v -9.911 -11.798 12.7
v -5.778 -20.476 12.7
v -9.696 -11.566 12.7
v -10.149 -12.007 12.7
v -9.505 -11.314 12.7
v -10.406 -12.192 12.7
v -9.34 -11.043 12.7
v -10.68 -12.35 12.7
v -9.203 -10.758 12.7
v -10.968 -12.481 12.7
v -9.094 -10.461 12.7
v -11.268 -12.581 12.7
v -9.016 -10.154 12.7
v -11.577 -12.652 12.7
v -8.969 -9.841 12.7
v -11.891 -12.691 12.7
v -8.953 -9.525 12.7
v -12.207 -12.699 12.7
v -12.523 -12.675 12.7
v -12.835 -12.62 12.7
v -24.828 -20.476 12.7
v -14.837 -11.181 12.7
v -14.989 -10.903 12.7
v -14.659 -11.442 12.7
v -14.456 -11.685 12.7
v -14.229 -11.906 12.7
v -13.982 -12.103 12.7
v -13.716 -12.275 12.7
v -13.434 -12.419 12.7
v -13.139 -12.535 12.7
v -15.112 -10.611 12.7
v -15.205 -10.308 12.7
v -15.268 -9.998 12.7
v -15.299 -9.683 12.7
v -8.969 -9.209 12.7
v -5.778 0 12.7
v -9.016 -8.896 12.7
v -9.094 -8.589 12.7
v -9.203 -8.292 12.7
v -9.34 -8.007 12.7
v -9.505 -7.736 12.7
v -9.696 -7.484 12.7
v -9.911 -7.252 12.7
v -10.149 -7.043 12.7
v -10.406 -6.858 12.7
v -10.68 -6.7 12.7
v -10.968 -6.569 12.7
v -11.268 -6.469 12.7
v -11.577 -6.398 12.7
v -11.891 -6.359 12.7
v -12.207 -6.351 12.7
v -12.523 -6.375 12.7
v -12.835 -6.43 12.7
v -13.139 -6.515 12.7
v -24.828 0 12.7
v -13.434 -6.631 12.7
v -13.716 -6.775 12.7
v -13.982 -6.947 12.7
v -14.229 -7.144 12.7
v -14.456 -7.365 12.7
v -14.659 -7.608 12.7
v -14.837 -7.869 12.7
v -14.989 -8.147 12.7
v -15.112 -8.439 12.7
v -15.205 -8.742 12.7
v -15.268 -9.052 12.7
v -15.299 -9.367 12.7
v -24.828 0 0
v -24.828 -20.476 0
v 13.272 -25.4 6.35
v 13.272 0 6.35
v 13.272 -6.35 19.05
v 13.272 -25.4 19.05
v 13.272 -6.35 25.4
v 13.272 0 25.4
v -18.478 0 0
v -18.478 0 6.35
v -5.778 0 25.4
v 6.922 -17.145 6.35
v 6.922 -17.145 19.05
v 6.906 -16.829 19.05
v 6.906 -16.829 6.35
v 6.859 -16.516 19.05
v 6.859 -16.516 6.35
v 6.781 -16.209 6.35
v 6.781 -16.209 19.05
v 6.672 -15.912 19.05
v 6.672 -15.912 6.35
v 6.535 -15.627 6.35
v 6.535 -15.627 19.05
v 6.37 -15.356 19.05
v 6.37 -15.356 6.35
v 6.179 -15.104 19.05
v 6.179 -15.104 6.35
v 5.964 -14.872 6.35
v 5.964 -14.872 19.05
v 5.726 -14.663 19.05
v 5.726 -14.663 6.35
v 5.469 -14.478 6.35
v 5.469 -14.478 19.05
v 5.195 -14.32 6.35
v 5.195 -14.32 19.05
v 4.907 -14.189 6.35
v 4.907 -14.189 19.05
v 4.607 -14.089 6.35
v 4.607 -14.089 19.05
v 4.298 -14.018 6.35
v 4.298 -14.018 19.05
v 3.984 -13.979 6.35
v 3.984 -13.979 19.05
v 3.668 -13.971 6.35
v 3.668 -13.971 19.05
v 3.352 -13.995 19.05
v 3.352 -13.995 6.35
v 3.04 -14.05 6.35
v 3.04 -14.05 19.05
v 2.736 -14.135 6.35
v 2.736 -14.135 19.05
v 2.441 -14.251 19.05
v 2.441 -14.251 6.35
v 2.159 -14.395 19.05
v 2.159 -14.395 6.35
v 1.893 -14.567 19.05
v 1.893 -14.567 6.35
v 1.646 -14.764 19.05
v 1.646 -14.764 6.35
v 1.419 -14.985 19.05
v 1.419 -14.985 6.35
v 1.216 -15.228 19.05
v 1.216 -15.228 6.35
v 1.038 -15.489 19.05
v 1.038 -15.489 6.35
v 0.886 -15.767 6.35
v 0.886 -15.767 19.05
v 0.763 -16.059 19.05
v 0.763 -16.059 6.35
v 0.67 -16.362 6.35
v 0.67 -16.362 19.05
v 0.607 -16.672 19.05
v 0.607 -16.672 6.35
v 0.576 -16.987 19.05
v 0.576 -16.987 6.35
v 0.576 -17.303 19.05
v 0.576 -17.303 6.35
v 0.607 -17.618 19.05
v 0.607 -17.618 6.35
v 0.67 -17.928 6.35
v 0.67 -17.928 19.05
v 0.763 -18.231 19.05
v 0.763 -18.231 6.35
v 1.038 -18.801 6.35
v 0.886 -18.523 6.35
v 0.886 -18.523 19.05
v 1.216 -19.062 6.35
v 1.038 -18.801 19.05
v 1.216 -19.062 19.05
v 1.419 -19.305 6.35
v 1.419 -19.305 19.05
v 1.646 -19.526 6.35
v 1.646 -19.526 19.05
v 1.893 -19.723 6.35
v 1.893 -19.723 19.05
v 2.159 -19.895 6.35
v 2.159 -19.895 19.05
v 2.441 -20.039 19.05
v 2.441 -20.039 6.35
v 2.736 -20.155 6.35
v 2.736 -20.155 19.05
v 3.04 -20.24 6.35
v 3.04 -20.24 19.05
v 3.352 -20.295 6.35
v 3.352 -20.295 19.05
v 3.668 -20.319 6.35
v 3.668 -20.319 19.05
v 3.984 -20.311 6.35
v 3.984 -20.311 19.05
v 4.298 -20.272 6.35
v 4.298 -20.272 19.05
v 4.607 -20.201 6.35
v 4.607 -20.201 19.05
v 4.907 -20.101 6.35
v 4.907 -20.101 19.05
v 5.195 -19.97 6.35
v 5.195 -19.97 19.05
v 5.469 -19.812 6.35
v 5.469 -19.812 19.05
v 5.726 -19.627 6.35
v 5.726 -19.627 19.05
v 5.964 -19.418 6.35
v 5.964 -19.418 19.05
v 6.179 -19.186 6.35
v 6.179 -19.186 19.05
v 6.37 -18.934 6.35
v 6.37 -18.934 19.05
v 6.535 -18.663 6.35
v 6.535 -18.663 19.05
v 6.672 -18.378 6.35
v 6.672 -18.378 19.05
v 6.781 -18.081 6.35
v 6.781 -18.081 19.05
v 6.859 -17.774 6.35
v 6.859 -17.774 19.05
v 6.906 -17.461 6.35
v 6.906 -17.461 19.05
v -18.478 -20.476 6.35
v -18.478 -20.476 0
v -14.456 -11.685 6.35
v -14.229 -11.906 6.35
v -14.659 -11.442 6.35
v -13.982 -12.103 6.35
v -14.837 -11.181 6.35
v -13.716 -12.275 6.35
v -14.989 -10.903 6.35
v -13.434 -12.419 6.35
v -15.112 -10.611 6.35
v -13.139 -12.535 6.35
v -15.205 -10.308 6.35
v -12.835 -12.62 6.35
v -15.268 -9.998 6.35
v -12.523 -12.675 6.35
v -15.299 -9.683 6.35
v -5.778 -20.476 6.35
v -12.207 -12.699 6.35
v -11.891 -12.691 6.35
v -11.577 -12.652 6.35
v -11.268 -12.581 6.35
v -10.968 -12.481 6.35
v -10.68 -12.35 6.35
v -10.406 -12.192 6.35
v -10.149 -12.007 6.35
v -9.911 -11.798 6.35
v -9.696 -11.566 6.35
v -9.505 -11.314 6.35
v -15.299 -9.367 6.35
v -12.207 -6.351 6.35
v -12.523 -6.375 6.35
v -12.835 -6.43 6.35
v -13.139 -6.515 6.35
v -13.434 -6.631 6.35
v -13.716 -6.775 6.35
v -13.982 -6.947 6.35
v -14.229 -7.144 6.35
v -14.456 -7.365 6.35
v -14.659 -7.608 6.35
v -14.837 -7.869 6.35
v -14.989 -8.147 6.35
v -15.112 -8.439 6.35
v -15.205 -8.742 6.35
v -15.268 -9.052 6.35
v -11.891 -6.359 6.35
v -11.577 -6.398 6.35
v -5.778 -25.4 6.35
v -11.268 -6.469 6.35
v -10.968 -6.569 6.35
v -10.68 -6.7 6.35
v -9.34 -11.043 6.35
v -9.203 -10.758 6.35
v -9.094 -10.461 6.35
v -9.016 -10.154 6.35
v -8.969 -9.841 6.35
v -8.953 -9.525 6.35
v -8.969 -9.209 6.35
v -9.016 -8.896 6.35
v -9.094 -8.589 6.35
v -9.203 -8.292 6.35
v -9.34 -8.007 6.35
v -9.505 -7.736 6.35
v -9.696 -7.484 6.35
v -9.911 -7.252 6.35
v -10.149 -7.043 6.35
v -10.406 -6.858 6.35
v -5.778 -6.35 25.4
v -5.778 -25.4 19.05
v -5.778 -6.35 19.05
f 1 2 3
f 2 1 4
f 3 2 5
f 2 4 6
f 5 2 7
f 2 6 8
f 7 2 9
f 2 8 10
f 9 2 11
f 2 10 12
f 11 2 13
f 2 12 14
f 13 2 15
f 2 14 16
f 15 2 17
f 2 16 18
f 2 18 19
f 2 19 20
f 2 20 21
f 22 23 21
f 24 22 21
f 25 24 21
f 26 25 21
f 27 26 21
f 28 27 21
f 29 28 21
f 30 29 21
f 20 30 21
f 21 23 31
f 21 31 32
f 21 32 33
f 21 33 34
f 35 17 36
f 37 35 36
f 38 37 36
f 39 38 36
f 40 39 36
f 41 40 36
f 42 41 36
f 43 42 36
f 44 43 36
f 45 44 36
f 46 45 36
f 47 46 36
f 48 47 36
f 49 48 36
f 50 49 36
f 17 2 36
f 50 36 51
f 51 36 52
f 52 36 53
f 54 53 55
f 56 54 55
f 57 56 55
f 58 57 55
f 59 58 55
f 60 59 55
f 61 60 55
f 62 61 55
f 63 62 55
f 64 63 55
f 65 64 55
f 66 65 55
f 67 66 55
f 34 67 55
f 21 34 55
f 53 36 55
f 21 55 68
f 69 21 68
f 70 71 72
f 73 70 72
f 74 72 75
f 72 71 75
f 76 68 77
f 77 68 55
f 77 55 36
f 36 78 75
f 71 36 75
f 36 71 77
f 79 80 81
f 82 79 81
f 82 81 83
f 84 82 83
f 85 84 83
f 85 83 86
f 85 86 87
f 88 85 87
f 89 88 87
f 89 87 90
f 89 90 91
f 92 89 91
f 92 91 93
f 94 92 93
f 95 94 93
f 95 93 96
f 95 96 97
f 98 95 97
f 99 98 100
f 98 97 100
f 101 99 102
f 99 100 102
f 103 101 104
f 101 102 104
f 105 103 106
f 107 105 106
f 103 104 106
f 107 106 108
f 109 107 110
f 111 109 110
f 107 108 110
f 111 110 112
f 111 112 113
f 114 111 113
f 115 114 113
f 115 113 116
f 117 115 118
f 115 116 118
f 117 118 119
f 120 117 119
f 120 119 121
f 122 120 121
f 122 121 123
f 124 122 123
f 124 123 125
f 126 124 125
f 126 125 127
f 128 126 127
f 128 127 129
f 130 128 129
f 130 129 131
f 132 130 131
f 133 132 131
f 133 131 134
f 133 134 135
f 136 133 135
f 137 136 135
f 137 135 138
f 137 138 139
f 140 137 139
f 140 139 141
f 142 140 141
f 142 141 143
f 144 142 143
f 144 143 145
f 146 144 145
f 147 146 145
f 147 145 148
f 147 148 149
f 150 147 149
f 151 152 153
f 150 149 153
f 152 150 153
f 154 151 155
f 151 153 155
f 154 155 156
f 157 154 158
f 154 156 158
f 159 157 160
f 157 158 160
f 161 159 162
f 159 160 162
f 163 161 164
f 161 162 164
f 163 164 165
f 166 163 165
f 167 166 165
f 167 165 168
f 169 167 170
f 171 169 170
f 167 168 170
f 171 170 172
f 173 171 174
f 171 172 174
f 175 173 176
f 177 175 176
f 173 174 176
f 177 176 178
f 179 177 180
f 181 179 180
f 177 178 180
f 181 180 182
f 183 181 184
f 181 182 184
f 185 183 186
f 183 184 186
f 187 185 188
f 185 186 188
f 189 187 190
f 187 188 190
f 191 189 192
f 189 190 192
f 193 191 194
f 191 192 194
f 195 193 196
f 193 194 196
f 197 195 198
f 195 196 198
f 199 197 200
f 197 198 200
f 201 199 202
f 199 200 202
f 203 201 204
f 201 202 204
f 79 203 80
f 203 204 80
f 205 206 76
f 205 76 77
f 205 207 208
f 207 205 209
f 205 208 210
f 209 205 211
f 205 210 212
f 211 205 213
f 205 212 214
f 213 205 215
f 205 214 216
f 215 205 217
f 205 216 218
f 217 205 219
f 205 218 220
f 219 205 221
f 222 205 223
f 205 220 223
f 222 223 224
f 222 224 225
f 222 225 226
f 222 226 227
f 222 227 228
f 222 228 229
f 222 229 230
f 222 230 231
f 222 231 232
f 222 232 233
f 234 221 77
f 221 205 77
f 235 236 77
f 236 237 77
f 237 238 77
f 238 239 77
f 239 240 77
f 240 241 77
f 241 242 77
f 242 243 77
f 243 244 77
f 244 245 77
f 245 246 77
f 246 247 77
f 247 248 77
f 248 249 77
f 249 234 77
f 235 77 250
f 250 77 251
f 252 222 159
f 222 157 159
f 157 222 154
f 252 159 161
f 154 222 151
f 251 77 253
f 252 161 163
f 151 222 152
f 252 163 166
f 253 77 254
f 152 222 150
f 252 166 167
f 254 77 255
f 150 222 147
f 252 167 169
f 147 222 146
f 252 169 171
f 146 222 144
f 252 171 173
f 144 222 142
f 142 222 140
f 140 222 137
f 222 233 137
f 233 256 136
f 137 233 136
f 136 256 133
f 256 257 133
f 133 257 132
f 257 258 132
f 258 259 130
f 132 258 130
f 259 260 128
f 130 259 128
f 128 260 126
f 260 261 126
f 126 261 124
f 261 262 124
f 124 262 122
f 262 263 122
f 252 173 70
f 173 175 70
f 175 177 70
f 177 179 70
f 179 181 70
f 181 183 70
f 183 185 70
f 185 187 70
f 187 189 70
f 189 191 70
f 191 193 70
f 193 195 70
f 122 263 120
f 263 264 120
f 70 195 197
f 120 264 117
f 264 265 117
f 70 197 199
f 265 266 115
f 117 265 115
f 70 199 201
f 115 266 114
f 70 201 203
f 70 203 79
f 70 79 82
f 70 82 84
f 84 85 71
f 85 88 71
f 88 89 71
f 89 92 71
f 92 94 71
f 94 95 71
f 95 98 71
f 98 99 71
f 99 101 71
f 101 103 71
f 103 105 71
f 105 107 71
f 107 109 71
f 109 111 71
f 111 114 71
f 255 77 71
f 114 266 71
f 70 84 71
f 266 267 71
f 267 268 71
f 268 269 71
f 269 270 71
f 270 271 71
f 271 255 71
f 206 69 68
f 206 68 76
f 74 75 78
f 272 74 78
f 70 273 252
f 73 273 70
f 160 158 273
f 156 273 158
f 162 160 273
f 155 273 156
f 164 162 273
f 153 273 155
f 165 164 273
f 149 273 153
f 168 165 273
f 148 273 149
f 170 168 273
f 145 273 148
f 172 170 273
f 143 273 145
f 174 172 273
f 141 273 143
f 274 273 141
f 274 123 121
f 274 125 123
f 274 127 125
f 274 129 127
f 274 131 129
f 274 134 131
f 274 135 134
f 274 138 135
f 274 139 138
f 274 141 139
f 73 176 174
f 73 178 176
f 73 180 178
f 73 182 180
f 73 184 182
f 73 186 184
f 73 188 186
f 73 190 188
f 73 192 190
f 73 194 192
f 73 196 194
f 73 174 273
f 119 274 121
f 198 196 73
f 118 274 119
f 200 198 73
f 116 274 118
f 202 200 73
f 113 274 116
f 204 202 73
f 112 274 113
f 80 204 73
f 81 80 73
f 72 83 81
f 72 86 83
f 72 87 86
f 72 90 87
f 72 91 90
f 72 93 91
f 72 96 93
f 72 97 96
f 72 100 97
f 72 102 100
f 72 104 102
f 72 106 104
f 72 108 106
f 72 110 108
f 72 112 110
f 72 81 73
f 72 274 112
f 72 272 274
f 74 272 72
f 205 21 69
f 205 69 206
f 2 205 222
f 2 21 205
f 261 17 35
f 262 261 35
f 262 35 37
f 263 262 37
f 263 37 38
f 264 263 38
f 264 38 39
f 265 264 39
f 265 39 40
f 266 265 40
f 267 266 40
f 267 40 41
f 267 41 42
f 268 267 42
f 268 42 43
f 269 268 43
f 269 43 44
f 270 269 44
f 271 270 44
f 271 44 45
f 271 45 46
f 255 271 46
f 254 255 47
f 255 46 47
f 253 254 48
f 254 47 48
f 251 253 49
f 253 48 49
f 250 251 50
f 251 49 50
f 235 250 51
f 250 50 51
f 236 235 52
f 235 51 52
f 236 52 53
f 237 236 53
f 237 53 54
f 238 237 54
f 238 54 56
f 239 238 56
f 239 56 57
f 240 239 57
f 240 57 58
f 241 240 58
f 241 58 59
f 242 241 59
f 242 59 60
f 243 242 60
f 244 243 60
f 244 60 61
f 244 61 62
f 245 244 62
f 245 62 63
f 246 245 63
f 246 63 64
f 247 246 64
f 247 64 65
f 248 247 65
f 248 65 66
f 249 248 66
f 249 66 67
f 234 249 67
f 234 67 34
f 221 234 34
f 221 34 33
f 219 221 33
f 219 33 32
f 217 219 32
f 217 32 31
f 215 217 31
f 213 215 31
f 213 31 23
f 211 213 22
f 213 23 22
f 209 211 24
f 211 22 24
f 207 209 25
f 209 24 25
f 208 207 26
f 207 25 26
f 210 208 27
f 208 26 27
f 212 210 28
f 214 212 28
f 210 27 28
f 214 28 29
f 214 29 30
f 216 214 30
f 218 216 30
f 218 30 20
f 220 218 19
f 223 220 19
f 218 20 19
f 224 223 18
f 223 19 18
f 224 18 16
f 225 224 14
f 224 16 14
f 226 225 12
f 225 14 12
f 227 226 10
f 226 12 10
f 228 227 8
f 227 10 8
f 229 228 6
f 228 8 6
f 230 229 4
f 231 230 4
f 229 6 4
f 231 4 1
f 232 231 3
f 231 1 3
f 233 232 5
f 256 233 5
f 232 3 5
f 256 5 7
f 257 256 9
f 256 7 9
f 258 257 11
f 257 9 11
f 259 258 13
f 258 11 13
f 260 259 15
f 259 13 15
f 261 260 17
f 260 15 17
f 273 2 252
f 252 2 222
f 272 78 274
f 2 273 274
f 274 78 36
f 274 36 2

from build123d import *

# Parameters (mm, degrees)
F1_DEPTH = 25.4
F2_W     = 19.05
F2_H     = 4.923508
F3_DEPTH = 25.4
F4_R     = 3.175
F5_DEPTH = 12.701
F6_R     = 3.175
F7_DEPTH = 25.4
F8_W     = 19.05
F8_H     = 19.05
F9_DEPTH = 6.35


with BuildPart() as f1:
    # F0 (on Front) → F1 (new body)
    with BuildSketch(Plane.XZ):
        Polygon((-24.8282, 12.7), (-24.8282, 0), (-18.4782, 0), (-18.4782, 6.35), (13.2718, 6.35), (13.2718, 25.4), (-5.7782, 25.4), (-5.7782, 12.7), align=None)
    extrude(amount=F1_DEPTH)

    # F2 (on face) → F3 (cut)
    with BuildSketch(Plane.XY.offset(12.7)):
        with Locations((-15.3032, -22.938246)):
            Rectangle(F2_W, F2_H)
    extrude(amount=-F3_DEPTH, mode=Mode.SUBTRACT)

    # F4 (on face) → F5 (cut, through all)
    with BuildSketch(Plane.XY.offset(12.7)):
        with Locations((-12.1282, -9.525)):
            Circle(F4_R)
    extrude(amount=-F5_DEPTH, mode=Mode.SUBTRACT)

    # F6 (on face) → F7 (cut)
    with BuildSketch(Plane.XY.offset(25.4)):
        with Locations((3.7468, -17.145)):
            Circle(F6_R)
    extrude(amount=-F7_DEPTH, mode=Mode.SUBTRACT)

    # F8 (on face) → F9 (cut)
    with BuildSketch(Plane.XY.offset(25.4)):
        with Locations((3.7468, -15.875)):
            Rectangle(F8_W, F8_H)
    extrude(amount=-F9_DEPTH, mode=Mode.SUBTRACT)


solid = f1.part
